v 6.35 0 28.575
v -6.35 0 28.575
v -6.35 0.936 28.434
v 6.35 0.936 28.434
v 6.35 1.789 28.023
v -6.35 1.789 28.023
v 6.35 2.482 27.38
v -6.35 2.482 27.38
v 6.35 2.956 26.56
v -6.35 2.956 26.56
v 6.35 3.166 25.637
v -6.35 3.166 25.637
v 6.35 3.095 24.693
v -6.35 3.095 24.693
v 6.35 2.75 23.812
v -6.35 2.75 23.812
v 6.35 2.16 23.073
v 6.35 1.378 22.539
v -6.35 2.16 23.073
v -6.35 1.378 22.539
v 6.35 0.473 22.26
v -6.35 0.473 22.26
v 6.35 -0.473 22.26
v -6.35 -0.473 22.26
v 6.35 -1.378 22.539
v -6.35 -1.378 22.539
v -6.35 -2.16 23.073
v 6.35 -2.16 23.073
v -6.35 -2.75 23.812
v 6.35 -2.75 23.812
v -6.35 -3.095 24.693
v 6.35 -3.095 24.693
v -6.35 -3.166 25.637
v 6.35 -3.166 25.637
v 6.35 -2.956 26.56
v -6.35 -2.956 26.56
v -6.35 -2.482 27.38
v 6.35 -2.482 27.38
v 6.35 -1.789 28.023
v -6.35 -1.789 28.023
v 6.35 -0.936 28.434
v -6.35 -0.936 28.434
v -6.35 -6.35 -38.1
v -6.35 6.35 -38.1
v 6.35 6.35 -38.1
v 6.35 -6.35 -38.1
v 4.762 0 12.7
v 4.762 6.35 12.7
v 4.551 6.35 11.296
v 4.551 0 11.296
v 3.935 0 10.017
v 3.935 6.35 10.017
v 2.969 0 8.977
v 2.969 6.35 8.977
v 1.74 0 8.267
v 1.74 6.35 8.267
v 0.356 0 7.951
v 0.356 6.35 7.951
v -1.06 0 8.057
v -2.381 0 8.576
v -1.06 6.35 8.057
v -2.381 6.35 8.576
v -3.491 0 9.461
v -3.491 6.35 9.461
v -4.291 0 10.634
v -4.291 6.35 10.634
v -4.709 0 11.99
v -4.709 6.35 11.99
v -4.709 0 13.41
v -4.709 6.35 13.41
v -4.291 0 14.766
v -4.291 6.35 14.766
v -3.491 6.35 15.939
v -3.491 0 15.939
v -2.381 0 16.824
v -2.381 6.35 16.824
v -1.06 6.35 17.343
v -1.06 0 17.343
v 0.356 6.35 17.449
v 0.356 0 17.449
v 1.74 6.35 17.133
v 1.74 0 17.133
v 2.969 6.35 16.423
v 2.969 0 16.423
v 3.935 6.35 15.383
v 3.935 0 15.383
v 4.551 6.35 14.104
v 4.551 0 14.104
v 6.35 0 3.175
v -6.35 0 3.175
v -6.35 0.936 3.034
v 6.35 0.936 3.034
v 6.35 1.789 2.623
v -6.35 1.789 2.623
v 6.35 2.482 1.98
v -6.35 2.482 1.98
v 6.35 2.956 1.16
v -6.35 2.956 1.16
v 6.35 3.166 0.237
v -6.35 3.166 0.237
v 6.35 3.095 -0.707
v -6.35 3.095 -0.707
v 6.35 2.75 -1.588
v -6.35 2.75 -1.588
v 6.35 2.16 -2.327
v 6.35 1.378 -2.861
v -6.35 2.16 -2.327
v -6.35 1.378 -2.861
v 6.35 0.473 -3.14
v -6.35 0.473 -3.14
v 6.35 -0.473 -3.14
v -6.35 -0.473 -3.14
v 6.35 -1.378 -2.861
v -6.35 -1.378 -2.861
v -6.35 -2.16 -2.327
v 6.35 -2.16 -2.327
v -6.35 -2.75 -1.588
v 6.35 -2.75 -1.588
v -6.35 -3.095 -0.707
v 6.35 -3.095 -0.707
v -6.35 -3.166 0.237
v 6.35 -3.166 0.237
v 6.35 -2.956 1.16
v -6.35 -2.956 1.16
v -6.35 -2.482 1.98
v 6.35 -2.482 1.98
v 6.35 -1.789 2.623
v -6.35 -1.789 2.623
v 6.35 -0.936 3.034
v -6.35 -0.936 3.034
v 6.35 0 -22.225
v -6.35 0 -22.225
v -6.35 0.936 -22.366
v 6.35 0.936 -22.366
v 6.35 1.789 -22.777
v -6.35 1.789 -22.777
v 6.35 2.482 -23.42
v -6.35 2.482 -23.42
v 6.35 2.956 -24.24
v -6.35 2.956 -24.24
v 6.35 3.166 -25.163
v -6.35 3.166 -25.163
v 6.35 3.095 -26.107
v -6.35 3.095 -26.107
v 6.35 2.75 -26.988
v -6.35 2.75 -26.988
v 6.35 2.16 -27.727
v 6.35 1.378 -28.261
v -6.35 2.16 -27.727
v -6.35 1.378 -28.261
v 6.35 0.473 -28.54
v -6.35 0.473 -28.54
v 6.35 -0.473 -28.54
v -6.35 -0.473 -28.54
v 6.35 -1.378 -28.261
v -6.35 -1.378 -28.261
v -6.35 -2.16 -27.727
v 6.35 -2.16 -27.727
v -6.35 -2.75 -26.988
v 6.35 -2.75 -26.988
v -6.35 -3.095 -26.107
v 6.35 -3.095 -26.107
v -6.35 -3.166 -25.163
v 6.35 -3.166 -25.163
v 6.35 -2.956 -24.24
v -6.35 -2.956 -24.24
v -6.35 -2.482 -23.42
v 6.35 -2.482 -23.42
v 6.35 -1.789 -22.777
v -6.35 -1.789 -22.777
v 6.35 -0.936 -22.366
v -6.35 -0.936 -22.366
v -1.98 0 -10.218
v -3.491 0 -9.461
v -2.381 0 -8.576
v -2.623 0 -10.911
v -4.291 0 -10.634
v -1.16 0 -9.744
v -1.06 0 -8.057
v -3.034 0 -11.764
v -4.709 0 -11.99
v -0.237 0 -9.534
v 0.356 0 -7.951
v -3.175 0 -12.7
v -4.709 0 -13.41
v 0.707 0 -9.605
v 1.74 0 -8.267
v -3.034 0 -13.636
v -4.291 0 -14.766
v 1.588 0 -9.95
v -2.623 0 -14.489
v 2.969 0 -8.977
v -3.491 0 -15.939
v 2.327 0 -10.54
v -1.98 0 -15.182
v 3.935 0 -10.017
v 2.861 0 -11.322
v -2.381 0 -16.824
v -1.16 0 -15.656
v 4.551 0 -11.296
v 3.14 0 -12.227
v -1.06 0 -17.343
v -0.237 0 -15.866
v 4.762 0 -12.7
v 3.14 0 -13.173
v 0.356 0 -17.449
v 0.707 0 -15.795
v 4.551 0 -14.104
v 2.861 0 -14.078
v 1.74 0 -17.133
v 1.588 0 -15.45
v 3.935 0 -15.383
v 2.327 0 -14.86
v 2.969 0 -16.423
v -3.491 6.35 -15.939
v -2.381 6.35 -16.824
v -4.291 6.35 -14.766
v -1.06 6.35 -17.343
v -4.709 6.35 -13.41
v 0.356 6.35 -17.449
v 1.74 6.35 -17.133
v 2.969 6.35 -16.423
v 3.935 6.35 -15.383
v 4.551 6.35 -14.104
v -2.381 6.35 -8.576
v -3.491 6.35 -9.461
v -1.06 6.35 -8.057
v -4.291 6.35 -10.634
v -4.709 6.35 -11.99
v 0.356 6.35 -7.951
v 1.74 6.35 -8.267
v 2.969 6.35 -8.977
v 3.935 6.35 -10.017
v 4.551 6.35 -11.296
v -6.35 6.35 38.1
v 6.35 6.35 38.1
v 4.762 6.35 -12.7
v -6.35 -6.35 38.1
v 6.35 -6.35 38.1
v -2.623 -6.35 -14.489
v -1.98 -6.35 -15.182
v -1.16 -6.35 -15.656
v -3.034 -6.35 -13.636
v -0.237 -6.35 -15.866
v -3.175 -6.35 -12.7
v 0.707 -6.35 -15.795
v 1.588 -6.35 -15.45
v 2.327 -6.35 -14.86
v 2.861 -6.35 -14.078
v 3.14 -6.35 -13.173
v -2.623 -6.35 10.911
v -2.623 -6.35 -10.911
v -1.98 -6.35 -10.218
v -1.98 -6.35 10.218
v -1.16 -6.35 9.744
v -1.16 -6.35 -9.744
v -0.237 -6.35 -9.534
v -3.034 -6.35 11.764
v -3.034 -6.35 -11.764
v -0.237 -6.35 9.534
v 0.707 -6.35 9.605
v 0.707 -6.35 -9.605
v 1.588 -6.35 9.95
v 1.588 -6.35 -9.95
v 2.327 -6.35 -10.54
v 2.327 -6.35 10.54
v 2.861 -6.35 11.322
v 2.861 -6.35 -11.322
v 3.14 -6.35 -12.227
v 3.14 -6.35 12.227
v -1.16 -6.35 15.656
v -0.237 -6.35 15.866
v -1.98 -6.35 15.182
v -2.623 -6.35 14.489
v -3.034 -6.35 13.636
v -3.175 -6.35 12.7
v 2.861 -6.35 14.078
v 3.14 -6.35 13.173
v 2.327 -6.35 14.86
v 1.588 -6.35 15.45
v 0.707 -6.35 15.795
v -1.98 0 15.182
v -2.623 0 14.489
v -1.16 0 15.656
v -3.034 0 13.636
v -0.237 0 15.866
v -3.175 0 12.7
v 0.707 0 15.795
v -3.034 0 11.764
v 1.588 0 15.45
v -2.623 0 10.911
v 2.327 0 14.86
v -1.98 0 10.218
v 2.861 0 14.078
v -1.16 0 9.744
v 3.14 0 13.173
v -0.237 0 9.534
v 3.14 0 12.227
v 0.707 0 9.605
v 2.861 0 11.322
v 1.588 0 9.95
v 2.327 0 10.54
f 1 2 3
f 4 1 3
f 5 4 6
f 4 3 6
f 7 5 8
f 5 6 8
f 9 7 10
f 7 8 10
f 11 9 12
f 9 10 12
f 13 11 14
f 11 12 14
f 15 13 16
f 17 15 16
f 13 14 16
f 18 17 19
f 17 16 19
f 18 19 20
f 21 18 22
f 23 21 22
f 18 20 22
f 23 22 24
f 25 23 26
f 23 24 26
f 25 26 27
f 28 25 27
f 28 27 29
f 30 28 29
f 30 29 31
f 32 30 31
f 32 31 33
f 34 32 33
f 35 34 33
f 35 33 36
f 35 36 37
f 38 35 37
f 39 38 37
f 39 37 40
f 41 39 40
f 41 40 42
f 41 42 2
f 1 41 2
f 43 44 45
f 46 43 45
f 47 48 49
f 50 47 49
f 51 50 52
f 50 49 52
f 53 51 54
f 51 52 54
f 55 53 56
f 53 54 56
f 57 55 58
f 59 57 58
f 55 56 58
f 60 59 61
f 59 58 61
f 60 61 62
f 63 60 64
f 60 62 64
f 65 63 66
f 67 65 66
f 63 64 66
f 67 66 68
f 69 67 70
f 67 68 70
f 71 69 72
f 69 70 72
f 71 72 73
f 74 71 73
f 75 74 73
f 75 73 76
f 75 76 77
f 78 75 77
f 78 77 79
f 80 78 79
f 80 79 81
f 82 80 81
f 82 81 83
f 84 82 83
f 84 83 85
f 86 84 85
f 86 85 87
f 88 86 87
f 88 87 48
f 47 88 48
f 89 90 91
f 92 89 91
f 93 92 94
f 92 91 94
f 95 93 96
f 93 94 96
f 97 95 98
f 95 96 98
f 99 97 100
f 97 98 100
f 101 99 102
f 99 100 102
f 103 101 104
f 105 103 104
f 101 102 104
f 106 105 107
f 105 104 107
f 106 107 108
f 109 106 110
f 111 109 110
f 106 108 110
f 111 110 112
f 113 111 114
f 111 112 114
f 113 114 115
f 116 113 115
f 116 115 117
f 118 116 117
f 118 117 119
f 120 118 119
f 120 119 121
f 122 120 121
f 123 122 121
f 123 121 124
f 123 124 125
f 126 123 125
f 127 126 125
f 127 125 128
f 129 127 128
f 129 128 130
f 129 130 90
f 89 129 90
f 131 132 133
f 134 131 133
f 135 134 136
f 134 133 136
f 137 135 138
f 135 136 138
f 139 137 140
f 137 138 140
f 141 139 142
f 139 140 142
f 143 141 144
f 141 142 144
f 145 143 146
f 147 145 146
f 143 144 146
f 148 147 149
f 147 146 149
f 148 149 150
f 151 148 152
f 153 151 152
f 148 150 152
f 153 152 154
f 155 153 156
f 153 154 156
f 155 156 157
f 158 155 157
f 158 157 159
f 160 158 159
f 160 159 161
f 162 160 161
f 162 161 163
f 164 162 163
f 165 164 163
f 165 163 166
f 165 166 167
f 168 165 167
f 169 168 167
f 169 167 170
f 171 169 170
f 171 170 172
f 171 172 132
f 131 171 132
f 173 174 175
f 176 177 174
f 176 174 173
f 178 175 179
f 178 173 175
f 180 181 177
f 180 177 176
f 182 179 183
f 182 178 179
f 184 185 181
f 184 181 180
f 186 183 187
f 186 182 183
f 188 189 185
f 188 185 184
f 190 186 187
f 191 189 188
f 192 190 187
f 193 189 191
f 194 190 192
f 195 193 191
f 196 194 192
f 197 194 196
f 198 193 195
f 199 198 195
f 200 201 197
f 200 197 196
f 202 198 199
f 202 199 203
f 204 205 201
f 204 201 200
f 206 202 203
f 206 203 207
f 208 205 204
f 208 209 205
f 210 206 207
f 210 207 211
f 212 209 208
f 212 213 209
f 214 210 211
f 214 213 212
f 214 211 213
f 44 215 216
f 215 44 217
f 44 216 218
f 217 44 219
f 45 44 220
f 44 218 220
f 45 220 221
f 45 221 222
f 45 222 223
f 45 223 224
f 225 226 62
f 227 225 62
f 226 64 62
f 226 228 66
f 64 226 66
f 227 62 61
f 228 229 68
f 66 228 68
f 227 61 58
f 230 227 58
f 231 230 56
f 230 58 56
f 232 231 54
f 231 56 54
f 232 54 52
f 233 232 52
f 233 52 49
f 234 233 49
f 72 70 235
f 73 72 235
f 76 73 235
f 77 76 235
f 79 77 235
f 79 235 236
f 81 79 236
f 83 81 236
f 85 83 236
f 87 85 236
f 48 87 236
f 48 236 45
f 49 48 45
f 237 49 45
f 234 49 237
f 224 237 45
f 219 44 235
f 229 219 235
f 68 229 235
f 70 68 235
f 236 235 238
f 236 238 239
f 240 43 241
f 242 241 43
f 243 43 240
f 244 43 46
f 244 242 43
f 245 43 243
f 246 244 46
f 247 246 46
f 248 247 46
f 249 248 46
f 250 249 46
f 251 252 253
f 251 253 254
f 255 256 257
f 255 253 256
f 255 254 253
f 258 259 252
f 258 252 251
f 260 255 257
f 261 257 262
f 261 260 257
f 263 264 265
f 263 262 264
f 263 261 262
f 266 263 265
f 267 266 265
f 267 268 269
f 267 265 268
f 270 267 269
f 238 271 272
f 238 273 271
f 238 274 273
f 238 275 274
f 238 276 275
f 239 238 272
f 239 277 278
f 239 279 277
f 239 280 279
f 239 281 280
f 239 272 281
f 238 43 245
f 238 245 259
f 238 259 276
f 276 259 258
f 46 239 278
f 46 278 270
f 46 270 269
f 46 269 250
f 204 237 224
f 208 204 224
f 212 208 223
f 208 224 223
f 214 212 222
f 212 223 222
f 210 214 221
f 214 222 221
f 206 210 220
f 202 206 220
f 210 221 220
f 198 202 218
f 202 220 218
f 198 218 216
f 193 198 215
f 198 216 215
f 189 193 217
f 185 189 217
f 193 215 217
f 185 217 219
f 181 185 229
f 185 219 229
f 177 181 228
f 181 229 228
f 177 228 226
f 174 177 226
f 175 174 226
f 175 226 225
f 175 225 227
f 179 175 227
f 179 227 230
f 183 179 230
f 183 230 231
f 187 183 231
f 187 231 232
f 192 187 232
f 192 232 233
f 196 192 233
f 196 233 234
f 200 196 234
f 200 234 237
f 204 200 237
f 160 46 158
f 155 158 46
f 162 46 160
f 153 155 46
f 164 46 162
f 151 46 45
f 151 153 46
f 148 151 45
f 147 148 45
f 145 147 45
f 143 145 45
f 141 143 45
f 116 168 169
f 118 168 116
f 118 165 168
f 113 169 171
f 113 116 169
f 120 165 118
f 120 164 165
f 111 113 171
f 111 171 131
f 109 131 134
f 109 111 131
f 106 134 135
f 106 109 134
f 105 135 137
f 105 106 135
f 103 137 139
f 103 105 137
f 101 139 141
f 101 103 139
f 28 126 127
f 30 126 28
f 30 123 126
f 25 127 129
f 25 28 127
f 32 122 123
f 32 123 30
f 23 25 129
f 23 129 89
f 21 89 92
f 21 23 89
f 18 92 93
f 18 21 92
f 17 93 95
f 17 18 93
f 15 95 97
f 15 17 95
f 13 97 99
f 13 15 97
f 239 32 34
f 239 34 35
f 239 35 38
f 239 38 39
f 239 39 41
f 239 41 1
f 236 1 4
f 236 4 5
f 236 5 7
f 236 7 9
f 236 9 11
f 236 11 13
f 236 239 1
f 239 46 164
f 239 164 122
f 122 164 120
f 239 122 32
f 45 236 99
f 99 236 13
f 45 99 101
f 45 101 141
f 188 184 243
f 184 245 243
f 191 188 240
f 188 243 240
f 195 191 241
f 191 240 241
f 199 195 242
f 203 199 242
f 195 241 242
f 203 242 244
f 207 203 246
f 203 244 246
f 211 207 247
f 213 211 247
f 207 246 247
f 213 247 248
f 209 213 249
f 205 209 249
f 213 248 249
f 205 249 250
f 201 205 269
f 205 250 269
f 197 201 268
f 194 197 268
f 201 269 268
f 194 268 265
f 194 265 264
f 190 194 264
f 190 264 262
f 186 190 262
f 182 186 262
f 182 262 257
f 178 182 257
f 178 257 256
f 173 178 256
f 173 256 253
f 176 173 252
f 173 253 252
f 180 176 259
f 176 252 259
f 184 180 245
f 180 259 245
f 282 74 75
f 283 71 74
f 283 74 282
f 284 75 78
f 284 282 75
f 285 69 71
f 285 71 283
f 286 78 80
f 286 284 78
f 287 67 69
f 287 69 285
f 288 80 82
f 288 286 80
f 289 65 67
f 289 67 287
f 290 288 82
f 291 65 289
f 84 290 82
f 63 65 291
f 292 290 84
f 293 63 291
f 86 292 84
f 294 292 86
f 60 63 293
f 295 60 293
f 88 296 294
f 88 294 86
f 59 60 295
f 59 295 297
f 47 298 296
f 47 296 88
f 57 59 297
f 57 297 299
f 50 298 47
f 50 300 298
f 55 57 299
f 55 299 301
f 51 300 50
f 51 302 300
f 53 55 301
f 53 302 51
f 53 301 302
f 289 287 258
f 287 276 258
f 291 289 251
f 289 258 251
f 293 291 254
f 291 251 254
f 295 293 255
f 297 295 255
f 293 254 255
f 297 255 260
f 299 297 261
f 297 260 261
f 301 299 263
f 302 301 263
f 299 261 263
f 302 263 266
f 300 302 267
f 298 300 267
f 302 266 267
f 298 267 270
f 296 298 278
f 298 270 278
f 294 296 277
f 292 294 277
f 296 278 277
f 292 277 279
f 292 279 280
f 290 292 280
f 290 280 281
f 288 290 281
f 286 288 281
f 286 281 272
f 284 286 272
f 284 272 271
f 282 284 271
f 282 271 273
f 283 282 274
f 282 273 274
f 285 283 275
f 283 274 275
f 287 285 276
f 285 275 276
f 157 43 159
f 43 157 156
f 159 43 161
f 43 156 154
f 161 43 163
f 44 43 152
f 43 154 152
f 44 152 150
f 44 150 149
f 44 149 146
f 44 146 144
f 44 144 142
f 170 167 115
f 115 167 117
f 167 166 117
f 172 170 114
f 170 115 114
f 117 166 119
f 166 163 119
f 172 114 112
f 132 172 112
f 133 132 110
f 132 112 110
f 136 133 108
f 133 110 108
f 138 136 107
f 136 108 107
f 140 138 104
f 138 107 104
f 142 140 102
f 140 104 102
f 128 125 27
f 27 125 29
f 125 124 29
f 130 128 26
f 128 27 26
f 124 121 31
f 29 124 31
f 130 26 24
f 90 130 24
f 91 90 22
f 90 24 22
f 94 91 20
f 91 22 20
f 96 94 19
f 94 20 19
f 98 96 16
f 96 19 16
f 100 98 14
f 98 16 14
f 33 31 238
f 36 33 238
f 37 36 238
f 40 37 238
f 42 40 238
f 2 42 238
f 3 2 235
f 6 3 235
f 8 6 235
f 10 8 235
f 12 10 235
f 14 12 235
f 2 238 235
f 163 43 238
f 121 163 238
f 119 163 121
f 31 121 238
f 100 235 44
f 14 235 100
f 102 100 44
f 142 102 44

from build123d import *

# Parameters (mm, degrees)
SKETCH2_W                            = 12.7
SKETCH2_H                            = 12.7
BOSS_EXTRUDE1_DEPTH                  = 38.1
F_1_4_20_THREADED_C_BORE_D           = 6.35
F_1_4_20_THREADED_C_BORE_CBORE_D     = 9.525
F_1_4_20_THREADED_C_BORE_CBORE_DEPTH = 6.35
F_1_4_20_THREADED_HOLE_D             = 6.35


with BuildPart() as part:
    # Sketch2 → Boss-Extrude1 (new, symmetric)
    with BuildSketch(Plane.XY):
        Rectangle(SKETCH2_W, SKETCH2_H)
    extrude(amount=BOSS_EXTRUDE1_DEPTH, both=True)

    # 1/4"-20 threaded C-Bore (through all)
    with Locations(Plane(origin=(0, 6.35, 0), x_dir=(1, 0, 0), z_dir=(0, 1, 0))):
        with Locations((0, 12.7), (0, -12.7)):
            CounterBoreHole(F_1_4_20_THREADED_C_BORE_D / 2, F_1_4_20_THREADED_C_BORE_CBORE_D / 2, F_1_4_20_THREADED_C_BORE_CBORE_DEPTH)

    # 1/4"-20 threaded hole (through all)
    with Locations(Plane(origin=(6.35, 0, 0), x_dir=(0, 0, -1), z_dir=(1, 0, 0))):
        with Locations((-25.4, 0), (0, 0), (25.4, 0)):
            Hole(F_1_4_20_THREADED_HOLE_D / 2)


solid = part.part
